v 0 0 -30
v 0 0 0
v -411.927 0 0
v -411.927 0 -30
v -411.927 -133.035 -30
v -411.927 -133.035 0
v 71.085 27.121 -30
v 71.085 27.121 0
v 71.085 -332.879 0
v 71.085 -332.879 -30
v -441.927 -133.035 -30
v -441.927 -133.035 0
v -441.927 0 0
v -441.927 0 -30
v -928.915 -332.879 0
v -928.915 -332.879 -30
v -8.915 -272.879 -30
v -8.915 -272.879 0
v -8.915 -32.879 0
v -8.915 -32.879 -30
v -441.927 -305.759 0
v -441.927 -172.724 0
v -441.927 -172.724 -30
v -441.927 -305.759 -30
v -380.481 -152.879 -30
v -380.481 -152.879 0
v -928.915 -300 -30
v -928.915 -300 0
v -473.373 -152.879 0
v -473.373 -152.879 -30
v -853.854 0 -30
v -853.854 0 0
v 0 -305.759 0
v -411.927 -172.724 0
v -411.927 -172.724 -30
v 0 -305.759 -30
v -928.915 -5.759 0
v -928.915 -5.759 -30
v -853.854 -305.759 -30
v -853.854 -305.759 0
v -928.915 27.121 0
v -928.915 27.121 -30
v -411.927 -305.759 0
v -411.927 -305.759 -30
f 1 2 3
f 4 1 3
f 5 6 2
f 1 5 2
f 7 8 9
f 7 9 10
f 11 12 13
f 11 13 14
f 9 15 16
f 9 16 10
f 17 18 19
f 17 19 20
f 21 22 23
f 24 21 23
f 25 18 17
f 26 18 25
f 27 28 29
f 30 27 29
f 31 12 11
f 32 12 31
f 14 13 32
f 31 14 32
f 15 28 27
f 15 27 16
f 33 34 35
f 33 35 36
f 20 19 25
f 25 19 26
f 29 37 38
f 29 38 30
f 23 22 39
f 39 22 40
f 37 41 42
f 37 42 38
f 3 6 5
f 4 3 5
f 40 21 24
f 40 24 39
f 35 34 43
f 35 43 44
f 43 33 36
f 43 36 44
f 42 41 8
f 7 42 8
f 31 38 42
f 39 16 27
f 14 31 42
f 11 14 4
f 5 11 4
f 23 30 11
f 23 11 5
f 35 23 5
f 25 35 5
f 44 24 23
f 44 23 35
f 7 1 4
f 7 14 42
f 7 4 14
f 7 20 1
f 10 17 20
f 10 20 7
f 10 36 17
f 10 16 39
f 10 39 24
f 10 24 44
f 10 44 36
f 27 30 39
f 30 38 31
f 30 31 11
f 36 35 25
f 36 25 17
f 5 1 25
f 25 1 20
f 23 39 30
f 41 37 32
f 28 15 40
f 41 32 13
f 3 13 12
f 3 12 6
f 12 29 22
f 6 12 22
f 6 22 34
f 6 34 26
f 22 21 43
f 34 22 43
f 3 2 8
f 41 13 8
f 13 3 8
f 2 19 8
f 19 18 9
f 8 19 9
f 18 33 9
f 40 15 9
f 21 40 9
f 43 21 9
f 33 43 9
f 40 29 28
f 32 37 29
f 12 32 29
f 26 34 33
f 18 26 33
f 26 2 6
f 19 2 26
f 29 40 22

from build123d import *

# Parameters (mm, degrees)
ORIGINAL_TRUSS_PART_DEPTH = 30
SKETCH14_W                = 30
SKETCH14_H                = 30
CENTER_SUPPORT_DEPTH      = 305.758522
RIGHT_SUPPORT_REACH       = 302
SKETCH15_W                = 80
SKETCH15_H                = 30


with BuildPart() as part:
    # Sketch2 → Original Truss Part (new body)
    with BuildSketch(Plane.XY):
        Polygon((0, 0), (-928.915298157, 0), (-928.915298157, 27.120739154), (71.084701843, 27.120739154), (71.084701843, -32.879260846), (-8.915298157, -32.879260846), (-928.915298157, -330), (-928.915298157, -300), align=None)
    original_truss_part = extrude(amount=-ORIGINAL_TRUSS_PART_DEPTH)

    # OG Part Mirror: Original Truss Part across plane
    add(original_truss_part.mirror(Plane.ZX.offset(-152.879260846)))

    # Sketch14 → Center Support (add)
    with BuildSketch(Plane(origin=(0, -305.758521692, 0), x_dir=(1, 0, 0), z_dir=(0, 1, 0))):
        with Locations((-426.927182328, 15)):
            Rectangle(SKETCH14_W, SKETCH14_H)
    extrude(amount=CENTER_SUPPORT_DEPTH)

    # Right Support: up to this plane
    right_support_end = Plane(origin=(-8.915298157, -32.879260846, -30), z_dir=(0.307327428, -0.951603831, 0))
    # Sketch15 → Right Support (add, up to the surface)
    with BuildSketch(Plane(origin=(0, -272.879260846, 0), x_dir=(1, 0, 0), z_dir=(0, 1, 0)), mode=Mode.PRIVATE) as right_support_sk1:
        with Locations((31.084701843, 15)):
            Rectangle(SKETCH15_W, SKETCH15_H)
    right_support_tool1 = split(extrude(right_support_sk1.sketch, amount=RIGHT_SUPPORT_REACH, mode=Mode.PRIVATE), bisect_by=right_support_end, keep=Keep.BOTH, mode=Mode.PRIVATE)
    add(right_support_tool1.solids().sort_by_distance((31.084702, -272.879261, -15))[0])


solid = part.part
